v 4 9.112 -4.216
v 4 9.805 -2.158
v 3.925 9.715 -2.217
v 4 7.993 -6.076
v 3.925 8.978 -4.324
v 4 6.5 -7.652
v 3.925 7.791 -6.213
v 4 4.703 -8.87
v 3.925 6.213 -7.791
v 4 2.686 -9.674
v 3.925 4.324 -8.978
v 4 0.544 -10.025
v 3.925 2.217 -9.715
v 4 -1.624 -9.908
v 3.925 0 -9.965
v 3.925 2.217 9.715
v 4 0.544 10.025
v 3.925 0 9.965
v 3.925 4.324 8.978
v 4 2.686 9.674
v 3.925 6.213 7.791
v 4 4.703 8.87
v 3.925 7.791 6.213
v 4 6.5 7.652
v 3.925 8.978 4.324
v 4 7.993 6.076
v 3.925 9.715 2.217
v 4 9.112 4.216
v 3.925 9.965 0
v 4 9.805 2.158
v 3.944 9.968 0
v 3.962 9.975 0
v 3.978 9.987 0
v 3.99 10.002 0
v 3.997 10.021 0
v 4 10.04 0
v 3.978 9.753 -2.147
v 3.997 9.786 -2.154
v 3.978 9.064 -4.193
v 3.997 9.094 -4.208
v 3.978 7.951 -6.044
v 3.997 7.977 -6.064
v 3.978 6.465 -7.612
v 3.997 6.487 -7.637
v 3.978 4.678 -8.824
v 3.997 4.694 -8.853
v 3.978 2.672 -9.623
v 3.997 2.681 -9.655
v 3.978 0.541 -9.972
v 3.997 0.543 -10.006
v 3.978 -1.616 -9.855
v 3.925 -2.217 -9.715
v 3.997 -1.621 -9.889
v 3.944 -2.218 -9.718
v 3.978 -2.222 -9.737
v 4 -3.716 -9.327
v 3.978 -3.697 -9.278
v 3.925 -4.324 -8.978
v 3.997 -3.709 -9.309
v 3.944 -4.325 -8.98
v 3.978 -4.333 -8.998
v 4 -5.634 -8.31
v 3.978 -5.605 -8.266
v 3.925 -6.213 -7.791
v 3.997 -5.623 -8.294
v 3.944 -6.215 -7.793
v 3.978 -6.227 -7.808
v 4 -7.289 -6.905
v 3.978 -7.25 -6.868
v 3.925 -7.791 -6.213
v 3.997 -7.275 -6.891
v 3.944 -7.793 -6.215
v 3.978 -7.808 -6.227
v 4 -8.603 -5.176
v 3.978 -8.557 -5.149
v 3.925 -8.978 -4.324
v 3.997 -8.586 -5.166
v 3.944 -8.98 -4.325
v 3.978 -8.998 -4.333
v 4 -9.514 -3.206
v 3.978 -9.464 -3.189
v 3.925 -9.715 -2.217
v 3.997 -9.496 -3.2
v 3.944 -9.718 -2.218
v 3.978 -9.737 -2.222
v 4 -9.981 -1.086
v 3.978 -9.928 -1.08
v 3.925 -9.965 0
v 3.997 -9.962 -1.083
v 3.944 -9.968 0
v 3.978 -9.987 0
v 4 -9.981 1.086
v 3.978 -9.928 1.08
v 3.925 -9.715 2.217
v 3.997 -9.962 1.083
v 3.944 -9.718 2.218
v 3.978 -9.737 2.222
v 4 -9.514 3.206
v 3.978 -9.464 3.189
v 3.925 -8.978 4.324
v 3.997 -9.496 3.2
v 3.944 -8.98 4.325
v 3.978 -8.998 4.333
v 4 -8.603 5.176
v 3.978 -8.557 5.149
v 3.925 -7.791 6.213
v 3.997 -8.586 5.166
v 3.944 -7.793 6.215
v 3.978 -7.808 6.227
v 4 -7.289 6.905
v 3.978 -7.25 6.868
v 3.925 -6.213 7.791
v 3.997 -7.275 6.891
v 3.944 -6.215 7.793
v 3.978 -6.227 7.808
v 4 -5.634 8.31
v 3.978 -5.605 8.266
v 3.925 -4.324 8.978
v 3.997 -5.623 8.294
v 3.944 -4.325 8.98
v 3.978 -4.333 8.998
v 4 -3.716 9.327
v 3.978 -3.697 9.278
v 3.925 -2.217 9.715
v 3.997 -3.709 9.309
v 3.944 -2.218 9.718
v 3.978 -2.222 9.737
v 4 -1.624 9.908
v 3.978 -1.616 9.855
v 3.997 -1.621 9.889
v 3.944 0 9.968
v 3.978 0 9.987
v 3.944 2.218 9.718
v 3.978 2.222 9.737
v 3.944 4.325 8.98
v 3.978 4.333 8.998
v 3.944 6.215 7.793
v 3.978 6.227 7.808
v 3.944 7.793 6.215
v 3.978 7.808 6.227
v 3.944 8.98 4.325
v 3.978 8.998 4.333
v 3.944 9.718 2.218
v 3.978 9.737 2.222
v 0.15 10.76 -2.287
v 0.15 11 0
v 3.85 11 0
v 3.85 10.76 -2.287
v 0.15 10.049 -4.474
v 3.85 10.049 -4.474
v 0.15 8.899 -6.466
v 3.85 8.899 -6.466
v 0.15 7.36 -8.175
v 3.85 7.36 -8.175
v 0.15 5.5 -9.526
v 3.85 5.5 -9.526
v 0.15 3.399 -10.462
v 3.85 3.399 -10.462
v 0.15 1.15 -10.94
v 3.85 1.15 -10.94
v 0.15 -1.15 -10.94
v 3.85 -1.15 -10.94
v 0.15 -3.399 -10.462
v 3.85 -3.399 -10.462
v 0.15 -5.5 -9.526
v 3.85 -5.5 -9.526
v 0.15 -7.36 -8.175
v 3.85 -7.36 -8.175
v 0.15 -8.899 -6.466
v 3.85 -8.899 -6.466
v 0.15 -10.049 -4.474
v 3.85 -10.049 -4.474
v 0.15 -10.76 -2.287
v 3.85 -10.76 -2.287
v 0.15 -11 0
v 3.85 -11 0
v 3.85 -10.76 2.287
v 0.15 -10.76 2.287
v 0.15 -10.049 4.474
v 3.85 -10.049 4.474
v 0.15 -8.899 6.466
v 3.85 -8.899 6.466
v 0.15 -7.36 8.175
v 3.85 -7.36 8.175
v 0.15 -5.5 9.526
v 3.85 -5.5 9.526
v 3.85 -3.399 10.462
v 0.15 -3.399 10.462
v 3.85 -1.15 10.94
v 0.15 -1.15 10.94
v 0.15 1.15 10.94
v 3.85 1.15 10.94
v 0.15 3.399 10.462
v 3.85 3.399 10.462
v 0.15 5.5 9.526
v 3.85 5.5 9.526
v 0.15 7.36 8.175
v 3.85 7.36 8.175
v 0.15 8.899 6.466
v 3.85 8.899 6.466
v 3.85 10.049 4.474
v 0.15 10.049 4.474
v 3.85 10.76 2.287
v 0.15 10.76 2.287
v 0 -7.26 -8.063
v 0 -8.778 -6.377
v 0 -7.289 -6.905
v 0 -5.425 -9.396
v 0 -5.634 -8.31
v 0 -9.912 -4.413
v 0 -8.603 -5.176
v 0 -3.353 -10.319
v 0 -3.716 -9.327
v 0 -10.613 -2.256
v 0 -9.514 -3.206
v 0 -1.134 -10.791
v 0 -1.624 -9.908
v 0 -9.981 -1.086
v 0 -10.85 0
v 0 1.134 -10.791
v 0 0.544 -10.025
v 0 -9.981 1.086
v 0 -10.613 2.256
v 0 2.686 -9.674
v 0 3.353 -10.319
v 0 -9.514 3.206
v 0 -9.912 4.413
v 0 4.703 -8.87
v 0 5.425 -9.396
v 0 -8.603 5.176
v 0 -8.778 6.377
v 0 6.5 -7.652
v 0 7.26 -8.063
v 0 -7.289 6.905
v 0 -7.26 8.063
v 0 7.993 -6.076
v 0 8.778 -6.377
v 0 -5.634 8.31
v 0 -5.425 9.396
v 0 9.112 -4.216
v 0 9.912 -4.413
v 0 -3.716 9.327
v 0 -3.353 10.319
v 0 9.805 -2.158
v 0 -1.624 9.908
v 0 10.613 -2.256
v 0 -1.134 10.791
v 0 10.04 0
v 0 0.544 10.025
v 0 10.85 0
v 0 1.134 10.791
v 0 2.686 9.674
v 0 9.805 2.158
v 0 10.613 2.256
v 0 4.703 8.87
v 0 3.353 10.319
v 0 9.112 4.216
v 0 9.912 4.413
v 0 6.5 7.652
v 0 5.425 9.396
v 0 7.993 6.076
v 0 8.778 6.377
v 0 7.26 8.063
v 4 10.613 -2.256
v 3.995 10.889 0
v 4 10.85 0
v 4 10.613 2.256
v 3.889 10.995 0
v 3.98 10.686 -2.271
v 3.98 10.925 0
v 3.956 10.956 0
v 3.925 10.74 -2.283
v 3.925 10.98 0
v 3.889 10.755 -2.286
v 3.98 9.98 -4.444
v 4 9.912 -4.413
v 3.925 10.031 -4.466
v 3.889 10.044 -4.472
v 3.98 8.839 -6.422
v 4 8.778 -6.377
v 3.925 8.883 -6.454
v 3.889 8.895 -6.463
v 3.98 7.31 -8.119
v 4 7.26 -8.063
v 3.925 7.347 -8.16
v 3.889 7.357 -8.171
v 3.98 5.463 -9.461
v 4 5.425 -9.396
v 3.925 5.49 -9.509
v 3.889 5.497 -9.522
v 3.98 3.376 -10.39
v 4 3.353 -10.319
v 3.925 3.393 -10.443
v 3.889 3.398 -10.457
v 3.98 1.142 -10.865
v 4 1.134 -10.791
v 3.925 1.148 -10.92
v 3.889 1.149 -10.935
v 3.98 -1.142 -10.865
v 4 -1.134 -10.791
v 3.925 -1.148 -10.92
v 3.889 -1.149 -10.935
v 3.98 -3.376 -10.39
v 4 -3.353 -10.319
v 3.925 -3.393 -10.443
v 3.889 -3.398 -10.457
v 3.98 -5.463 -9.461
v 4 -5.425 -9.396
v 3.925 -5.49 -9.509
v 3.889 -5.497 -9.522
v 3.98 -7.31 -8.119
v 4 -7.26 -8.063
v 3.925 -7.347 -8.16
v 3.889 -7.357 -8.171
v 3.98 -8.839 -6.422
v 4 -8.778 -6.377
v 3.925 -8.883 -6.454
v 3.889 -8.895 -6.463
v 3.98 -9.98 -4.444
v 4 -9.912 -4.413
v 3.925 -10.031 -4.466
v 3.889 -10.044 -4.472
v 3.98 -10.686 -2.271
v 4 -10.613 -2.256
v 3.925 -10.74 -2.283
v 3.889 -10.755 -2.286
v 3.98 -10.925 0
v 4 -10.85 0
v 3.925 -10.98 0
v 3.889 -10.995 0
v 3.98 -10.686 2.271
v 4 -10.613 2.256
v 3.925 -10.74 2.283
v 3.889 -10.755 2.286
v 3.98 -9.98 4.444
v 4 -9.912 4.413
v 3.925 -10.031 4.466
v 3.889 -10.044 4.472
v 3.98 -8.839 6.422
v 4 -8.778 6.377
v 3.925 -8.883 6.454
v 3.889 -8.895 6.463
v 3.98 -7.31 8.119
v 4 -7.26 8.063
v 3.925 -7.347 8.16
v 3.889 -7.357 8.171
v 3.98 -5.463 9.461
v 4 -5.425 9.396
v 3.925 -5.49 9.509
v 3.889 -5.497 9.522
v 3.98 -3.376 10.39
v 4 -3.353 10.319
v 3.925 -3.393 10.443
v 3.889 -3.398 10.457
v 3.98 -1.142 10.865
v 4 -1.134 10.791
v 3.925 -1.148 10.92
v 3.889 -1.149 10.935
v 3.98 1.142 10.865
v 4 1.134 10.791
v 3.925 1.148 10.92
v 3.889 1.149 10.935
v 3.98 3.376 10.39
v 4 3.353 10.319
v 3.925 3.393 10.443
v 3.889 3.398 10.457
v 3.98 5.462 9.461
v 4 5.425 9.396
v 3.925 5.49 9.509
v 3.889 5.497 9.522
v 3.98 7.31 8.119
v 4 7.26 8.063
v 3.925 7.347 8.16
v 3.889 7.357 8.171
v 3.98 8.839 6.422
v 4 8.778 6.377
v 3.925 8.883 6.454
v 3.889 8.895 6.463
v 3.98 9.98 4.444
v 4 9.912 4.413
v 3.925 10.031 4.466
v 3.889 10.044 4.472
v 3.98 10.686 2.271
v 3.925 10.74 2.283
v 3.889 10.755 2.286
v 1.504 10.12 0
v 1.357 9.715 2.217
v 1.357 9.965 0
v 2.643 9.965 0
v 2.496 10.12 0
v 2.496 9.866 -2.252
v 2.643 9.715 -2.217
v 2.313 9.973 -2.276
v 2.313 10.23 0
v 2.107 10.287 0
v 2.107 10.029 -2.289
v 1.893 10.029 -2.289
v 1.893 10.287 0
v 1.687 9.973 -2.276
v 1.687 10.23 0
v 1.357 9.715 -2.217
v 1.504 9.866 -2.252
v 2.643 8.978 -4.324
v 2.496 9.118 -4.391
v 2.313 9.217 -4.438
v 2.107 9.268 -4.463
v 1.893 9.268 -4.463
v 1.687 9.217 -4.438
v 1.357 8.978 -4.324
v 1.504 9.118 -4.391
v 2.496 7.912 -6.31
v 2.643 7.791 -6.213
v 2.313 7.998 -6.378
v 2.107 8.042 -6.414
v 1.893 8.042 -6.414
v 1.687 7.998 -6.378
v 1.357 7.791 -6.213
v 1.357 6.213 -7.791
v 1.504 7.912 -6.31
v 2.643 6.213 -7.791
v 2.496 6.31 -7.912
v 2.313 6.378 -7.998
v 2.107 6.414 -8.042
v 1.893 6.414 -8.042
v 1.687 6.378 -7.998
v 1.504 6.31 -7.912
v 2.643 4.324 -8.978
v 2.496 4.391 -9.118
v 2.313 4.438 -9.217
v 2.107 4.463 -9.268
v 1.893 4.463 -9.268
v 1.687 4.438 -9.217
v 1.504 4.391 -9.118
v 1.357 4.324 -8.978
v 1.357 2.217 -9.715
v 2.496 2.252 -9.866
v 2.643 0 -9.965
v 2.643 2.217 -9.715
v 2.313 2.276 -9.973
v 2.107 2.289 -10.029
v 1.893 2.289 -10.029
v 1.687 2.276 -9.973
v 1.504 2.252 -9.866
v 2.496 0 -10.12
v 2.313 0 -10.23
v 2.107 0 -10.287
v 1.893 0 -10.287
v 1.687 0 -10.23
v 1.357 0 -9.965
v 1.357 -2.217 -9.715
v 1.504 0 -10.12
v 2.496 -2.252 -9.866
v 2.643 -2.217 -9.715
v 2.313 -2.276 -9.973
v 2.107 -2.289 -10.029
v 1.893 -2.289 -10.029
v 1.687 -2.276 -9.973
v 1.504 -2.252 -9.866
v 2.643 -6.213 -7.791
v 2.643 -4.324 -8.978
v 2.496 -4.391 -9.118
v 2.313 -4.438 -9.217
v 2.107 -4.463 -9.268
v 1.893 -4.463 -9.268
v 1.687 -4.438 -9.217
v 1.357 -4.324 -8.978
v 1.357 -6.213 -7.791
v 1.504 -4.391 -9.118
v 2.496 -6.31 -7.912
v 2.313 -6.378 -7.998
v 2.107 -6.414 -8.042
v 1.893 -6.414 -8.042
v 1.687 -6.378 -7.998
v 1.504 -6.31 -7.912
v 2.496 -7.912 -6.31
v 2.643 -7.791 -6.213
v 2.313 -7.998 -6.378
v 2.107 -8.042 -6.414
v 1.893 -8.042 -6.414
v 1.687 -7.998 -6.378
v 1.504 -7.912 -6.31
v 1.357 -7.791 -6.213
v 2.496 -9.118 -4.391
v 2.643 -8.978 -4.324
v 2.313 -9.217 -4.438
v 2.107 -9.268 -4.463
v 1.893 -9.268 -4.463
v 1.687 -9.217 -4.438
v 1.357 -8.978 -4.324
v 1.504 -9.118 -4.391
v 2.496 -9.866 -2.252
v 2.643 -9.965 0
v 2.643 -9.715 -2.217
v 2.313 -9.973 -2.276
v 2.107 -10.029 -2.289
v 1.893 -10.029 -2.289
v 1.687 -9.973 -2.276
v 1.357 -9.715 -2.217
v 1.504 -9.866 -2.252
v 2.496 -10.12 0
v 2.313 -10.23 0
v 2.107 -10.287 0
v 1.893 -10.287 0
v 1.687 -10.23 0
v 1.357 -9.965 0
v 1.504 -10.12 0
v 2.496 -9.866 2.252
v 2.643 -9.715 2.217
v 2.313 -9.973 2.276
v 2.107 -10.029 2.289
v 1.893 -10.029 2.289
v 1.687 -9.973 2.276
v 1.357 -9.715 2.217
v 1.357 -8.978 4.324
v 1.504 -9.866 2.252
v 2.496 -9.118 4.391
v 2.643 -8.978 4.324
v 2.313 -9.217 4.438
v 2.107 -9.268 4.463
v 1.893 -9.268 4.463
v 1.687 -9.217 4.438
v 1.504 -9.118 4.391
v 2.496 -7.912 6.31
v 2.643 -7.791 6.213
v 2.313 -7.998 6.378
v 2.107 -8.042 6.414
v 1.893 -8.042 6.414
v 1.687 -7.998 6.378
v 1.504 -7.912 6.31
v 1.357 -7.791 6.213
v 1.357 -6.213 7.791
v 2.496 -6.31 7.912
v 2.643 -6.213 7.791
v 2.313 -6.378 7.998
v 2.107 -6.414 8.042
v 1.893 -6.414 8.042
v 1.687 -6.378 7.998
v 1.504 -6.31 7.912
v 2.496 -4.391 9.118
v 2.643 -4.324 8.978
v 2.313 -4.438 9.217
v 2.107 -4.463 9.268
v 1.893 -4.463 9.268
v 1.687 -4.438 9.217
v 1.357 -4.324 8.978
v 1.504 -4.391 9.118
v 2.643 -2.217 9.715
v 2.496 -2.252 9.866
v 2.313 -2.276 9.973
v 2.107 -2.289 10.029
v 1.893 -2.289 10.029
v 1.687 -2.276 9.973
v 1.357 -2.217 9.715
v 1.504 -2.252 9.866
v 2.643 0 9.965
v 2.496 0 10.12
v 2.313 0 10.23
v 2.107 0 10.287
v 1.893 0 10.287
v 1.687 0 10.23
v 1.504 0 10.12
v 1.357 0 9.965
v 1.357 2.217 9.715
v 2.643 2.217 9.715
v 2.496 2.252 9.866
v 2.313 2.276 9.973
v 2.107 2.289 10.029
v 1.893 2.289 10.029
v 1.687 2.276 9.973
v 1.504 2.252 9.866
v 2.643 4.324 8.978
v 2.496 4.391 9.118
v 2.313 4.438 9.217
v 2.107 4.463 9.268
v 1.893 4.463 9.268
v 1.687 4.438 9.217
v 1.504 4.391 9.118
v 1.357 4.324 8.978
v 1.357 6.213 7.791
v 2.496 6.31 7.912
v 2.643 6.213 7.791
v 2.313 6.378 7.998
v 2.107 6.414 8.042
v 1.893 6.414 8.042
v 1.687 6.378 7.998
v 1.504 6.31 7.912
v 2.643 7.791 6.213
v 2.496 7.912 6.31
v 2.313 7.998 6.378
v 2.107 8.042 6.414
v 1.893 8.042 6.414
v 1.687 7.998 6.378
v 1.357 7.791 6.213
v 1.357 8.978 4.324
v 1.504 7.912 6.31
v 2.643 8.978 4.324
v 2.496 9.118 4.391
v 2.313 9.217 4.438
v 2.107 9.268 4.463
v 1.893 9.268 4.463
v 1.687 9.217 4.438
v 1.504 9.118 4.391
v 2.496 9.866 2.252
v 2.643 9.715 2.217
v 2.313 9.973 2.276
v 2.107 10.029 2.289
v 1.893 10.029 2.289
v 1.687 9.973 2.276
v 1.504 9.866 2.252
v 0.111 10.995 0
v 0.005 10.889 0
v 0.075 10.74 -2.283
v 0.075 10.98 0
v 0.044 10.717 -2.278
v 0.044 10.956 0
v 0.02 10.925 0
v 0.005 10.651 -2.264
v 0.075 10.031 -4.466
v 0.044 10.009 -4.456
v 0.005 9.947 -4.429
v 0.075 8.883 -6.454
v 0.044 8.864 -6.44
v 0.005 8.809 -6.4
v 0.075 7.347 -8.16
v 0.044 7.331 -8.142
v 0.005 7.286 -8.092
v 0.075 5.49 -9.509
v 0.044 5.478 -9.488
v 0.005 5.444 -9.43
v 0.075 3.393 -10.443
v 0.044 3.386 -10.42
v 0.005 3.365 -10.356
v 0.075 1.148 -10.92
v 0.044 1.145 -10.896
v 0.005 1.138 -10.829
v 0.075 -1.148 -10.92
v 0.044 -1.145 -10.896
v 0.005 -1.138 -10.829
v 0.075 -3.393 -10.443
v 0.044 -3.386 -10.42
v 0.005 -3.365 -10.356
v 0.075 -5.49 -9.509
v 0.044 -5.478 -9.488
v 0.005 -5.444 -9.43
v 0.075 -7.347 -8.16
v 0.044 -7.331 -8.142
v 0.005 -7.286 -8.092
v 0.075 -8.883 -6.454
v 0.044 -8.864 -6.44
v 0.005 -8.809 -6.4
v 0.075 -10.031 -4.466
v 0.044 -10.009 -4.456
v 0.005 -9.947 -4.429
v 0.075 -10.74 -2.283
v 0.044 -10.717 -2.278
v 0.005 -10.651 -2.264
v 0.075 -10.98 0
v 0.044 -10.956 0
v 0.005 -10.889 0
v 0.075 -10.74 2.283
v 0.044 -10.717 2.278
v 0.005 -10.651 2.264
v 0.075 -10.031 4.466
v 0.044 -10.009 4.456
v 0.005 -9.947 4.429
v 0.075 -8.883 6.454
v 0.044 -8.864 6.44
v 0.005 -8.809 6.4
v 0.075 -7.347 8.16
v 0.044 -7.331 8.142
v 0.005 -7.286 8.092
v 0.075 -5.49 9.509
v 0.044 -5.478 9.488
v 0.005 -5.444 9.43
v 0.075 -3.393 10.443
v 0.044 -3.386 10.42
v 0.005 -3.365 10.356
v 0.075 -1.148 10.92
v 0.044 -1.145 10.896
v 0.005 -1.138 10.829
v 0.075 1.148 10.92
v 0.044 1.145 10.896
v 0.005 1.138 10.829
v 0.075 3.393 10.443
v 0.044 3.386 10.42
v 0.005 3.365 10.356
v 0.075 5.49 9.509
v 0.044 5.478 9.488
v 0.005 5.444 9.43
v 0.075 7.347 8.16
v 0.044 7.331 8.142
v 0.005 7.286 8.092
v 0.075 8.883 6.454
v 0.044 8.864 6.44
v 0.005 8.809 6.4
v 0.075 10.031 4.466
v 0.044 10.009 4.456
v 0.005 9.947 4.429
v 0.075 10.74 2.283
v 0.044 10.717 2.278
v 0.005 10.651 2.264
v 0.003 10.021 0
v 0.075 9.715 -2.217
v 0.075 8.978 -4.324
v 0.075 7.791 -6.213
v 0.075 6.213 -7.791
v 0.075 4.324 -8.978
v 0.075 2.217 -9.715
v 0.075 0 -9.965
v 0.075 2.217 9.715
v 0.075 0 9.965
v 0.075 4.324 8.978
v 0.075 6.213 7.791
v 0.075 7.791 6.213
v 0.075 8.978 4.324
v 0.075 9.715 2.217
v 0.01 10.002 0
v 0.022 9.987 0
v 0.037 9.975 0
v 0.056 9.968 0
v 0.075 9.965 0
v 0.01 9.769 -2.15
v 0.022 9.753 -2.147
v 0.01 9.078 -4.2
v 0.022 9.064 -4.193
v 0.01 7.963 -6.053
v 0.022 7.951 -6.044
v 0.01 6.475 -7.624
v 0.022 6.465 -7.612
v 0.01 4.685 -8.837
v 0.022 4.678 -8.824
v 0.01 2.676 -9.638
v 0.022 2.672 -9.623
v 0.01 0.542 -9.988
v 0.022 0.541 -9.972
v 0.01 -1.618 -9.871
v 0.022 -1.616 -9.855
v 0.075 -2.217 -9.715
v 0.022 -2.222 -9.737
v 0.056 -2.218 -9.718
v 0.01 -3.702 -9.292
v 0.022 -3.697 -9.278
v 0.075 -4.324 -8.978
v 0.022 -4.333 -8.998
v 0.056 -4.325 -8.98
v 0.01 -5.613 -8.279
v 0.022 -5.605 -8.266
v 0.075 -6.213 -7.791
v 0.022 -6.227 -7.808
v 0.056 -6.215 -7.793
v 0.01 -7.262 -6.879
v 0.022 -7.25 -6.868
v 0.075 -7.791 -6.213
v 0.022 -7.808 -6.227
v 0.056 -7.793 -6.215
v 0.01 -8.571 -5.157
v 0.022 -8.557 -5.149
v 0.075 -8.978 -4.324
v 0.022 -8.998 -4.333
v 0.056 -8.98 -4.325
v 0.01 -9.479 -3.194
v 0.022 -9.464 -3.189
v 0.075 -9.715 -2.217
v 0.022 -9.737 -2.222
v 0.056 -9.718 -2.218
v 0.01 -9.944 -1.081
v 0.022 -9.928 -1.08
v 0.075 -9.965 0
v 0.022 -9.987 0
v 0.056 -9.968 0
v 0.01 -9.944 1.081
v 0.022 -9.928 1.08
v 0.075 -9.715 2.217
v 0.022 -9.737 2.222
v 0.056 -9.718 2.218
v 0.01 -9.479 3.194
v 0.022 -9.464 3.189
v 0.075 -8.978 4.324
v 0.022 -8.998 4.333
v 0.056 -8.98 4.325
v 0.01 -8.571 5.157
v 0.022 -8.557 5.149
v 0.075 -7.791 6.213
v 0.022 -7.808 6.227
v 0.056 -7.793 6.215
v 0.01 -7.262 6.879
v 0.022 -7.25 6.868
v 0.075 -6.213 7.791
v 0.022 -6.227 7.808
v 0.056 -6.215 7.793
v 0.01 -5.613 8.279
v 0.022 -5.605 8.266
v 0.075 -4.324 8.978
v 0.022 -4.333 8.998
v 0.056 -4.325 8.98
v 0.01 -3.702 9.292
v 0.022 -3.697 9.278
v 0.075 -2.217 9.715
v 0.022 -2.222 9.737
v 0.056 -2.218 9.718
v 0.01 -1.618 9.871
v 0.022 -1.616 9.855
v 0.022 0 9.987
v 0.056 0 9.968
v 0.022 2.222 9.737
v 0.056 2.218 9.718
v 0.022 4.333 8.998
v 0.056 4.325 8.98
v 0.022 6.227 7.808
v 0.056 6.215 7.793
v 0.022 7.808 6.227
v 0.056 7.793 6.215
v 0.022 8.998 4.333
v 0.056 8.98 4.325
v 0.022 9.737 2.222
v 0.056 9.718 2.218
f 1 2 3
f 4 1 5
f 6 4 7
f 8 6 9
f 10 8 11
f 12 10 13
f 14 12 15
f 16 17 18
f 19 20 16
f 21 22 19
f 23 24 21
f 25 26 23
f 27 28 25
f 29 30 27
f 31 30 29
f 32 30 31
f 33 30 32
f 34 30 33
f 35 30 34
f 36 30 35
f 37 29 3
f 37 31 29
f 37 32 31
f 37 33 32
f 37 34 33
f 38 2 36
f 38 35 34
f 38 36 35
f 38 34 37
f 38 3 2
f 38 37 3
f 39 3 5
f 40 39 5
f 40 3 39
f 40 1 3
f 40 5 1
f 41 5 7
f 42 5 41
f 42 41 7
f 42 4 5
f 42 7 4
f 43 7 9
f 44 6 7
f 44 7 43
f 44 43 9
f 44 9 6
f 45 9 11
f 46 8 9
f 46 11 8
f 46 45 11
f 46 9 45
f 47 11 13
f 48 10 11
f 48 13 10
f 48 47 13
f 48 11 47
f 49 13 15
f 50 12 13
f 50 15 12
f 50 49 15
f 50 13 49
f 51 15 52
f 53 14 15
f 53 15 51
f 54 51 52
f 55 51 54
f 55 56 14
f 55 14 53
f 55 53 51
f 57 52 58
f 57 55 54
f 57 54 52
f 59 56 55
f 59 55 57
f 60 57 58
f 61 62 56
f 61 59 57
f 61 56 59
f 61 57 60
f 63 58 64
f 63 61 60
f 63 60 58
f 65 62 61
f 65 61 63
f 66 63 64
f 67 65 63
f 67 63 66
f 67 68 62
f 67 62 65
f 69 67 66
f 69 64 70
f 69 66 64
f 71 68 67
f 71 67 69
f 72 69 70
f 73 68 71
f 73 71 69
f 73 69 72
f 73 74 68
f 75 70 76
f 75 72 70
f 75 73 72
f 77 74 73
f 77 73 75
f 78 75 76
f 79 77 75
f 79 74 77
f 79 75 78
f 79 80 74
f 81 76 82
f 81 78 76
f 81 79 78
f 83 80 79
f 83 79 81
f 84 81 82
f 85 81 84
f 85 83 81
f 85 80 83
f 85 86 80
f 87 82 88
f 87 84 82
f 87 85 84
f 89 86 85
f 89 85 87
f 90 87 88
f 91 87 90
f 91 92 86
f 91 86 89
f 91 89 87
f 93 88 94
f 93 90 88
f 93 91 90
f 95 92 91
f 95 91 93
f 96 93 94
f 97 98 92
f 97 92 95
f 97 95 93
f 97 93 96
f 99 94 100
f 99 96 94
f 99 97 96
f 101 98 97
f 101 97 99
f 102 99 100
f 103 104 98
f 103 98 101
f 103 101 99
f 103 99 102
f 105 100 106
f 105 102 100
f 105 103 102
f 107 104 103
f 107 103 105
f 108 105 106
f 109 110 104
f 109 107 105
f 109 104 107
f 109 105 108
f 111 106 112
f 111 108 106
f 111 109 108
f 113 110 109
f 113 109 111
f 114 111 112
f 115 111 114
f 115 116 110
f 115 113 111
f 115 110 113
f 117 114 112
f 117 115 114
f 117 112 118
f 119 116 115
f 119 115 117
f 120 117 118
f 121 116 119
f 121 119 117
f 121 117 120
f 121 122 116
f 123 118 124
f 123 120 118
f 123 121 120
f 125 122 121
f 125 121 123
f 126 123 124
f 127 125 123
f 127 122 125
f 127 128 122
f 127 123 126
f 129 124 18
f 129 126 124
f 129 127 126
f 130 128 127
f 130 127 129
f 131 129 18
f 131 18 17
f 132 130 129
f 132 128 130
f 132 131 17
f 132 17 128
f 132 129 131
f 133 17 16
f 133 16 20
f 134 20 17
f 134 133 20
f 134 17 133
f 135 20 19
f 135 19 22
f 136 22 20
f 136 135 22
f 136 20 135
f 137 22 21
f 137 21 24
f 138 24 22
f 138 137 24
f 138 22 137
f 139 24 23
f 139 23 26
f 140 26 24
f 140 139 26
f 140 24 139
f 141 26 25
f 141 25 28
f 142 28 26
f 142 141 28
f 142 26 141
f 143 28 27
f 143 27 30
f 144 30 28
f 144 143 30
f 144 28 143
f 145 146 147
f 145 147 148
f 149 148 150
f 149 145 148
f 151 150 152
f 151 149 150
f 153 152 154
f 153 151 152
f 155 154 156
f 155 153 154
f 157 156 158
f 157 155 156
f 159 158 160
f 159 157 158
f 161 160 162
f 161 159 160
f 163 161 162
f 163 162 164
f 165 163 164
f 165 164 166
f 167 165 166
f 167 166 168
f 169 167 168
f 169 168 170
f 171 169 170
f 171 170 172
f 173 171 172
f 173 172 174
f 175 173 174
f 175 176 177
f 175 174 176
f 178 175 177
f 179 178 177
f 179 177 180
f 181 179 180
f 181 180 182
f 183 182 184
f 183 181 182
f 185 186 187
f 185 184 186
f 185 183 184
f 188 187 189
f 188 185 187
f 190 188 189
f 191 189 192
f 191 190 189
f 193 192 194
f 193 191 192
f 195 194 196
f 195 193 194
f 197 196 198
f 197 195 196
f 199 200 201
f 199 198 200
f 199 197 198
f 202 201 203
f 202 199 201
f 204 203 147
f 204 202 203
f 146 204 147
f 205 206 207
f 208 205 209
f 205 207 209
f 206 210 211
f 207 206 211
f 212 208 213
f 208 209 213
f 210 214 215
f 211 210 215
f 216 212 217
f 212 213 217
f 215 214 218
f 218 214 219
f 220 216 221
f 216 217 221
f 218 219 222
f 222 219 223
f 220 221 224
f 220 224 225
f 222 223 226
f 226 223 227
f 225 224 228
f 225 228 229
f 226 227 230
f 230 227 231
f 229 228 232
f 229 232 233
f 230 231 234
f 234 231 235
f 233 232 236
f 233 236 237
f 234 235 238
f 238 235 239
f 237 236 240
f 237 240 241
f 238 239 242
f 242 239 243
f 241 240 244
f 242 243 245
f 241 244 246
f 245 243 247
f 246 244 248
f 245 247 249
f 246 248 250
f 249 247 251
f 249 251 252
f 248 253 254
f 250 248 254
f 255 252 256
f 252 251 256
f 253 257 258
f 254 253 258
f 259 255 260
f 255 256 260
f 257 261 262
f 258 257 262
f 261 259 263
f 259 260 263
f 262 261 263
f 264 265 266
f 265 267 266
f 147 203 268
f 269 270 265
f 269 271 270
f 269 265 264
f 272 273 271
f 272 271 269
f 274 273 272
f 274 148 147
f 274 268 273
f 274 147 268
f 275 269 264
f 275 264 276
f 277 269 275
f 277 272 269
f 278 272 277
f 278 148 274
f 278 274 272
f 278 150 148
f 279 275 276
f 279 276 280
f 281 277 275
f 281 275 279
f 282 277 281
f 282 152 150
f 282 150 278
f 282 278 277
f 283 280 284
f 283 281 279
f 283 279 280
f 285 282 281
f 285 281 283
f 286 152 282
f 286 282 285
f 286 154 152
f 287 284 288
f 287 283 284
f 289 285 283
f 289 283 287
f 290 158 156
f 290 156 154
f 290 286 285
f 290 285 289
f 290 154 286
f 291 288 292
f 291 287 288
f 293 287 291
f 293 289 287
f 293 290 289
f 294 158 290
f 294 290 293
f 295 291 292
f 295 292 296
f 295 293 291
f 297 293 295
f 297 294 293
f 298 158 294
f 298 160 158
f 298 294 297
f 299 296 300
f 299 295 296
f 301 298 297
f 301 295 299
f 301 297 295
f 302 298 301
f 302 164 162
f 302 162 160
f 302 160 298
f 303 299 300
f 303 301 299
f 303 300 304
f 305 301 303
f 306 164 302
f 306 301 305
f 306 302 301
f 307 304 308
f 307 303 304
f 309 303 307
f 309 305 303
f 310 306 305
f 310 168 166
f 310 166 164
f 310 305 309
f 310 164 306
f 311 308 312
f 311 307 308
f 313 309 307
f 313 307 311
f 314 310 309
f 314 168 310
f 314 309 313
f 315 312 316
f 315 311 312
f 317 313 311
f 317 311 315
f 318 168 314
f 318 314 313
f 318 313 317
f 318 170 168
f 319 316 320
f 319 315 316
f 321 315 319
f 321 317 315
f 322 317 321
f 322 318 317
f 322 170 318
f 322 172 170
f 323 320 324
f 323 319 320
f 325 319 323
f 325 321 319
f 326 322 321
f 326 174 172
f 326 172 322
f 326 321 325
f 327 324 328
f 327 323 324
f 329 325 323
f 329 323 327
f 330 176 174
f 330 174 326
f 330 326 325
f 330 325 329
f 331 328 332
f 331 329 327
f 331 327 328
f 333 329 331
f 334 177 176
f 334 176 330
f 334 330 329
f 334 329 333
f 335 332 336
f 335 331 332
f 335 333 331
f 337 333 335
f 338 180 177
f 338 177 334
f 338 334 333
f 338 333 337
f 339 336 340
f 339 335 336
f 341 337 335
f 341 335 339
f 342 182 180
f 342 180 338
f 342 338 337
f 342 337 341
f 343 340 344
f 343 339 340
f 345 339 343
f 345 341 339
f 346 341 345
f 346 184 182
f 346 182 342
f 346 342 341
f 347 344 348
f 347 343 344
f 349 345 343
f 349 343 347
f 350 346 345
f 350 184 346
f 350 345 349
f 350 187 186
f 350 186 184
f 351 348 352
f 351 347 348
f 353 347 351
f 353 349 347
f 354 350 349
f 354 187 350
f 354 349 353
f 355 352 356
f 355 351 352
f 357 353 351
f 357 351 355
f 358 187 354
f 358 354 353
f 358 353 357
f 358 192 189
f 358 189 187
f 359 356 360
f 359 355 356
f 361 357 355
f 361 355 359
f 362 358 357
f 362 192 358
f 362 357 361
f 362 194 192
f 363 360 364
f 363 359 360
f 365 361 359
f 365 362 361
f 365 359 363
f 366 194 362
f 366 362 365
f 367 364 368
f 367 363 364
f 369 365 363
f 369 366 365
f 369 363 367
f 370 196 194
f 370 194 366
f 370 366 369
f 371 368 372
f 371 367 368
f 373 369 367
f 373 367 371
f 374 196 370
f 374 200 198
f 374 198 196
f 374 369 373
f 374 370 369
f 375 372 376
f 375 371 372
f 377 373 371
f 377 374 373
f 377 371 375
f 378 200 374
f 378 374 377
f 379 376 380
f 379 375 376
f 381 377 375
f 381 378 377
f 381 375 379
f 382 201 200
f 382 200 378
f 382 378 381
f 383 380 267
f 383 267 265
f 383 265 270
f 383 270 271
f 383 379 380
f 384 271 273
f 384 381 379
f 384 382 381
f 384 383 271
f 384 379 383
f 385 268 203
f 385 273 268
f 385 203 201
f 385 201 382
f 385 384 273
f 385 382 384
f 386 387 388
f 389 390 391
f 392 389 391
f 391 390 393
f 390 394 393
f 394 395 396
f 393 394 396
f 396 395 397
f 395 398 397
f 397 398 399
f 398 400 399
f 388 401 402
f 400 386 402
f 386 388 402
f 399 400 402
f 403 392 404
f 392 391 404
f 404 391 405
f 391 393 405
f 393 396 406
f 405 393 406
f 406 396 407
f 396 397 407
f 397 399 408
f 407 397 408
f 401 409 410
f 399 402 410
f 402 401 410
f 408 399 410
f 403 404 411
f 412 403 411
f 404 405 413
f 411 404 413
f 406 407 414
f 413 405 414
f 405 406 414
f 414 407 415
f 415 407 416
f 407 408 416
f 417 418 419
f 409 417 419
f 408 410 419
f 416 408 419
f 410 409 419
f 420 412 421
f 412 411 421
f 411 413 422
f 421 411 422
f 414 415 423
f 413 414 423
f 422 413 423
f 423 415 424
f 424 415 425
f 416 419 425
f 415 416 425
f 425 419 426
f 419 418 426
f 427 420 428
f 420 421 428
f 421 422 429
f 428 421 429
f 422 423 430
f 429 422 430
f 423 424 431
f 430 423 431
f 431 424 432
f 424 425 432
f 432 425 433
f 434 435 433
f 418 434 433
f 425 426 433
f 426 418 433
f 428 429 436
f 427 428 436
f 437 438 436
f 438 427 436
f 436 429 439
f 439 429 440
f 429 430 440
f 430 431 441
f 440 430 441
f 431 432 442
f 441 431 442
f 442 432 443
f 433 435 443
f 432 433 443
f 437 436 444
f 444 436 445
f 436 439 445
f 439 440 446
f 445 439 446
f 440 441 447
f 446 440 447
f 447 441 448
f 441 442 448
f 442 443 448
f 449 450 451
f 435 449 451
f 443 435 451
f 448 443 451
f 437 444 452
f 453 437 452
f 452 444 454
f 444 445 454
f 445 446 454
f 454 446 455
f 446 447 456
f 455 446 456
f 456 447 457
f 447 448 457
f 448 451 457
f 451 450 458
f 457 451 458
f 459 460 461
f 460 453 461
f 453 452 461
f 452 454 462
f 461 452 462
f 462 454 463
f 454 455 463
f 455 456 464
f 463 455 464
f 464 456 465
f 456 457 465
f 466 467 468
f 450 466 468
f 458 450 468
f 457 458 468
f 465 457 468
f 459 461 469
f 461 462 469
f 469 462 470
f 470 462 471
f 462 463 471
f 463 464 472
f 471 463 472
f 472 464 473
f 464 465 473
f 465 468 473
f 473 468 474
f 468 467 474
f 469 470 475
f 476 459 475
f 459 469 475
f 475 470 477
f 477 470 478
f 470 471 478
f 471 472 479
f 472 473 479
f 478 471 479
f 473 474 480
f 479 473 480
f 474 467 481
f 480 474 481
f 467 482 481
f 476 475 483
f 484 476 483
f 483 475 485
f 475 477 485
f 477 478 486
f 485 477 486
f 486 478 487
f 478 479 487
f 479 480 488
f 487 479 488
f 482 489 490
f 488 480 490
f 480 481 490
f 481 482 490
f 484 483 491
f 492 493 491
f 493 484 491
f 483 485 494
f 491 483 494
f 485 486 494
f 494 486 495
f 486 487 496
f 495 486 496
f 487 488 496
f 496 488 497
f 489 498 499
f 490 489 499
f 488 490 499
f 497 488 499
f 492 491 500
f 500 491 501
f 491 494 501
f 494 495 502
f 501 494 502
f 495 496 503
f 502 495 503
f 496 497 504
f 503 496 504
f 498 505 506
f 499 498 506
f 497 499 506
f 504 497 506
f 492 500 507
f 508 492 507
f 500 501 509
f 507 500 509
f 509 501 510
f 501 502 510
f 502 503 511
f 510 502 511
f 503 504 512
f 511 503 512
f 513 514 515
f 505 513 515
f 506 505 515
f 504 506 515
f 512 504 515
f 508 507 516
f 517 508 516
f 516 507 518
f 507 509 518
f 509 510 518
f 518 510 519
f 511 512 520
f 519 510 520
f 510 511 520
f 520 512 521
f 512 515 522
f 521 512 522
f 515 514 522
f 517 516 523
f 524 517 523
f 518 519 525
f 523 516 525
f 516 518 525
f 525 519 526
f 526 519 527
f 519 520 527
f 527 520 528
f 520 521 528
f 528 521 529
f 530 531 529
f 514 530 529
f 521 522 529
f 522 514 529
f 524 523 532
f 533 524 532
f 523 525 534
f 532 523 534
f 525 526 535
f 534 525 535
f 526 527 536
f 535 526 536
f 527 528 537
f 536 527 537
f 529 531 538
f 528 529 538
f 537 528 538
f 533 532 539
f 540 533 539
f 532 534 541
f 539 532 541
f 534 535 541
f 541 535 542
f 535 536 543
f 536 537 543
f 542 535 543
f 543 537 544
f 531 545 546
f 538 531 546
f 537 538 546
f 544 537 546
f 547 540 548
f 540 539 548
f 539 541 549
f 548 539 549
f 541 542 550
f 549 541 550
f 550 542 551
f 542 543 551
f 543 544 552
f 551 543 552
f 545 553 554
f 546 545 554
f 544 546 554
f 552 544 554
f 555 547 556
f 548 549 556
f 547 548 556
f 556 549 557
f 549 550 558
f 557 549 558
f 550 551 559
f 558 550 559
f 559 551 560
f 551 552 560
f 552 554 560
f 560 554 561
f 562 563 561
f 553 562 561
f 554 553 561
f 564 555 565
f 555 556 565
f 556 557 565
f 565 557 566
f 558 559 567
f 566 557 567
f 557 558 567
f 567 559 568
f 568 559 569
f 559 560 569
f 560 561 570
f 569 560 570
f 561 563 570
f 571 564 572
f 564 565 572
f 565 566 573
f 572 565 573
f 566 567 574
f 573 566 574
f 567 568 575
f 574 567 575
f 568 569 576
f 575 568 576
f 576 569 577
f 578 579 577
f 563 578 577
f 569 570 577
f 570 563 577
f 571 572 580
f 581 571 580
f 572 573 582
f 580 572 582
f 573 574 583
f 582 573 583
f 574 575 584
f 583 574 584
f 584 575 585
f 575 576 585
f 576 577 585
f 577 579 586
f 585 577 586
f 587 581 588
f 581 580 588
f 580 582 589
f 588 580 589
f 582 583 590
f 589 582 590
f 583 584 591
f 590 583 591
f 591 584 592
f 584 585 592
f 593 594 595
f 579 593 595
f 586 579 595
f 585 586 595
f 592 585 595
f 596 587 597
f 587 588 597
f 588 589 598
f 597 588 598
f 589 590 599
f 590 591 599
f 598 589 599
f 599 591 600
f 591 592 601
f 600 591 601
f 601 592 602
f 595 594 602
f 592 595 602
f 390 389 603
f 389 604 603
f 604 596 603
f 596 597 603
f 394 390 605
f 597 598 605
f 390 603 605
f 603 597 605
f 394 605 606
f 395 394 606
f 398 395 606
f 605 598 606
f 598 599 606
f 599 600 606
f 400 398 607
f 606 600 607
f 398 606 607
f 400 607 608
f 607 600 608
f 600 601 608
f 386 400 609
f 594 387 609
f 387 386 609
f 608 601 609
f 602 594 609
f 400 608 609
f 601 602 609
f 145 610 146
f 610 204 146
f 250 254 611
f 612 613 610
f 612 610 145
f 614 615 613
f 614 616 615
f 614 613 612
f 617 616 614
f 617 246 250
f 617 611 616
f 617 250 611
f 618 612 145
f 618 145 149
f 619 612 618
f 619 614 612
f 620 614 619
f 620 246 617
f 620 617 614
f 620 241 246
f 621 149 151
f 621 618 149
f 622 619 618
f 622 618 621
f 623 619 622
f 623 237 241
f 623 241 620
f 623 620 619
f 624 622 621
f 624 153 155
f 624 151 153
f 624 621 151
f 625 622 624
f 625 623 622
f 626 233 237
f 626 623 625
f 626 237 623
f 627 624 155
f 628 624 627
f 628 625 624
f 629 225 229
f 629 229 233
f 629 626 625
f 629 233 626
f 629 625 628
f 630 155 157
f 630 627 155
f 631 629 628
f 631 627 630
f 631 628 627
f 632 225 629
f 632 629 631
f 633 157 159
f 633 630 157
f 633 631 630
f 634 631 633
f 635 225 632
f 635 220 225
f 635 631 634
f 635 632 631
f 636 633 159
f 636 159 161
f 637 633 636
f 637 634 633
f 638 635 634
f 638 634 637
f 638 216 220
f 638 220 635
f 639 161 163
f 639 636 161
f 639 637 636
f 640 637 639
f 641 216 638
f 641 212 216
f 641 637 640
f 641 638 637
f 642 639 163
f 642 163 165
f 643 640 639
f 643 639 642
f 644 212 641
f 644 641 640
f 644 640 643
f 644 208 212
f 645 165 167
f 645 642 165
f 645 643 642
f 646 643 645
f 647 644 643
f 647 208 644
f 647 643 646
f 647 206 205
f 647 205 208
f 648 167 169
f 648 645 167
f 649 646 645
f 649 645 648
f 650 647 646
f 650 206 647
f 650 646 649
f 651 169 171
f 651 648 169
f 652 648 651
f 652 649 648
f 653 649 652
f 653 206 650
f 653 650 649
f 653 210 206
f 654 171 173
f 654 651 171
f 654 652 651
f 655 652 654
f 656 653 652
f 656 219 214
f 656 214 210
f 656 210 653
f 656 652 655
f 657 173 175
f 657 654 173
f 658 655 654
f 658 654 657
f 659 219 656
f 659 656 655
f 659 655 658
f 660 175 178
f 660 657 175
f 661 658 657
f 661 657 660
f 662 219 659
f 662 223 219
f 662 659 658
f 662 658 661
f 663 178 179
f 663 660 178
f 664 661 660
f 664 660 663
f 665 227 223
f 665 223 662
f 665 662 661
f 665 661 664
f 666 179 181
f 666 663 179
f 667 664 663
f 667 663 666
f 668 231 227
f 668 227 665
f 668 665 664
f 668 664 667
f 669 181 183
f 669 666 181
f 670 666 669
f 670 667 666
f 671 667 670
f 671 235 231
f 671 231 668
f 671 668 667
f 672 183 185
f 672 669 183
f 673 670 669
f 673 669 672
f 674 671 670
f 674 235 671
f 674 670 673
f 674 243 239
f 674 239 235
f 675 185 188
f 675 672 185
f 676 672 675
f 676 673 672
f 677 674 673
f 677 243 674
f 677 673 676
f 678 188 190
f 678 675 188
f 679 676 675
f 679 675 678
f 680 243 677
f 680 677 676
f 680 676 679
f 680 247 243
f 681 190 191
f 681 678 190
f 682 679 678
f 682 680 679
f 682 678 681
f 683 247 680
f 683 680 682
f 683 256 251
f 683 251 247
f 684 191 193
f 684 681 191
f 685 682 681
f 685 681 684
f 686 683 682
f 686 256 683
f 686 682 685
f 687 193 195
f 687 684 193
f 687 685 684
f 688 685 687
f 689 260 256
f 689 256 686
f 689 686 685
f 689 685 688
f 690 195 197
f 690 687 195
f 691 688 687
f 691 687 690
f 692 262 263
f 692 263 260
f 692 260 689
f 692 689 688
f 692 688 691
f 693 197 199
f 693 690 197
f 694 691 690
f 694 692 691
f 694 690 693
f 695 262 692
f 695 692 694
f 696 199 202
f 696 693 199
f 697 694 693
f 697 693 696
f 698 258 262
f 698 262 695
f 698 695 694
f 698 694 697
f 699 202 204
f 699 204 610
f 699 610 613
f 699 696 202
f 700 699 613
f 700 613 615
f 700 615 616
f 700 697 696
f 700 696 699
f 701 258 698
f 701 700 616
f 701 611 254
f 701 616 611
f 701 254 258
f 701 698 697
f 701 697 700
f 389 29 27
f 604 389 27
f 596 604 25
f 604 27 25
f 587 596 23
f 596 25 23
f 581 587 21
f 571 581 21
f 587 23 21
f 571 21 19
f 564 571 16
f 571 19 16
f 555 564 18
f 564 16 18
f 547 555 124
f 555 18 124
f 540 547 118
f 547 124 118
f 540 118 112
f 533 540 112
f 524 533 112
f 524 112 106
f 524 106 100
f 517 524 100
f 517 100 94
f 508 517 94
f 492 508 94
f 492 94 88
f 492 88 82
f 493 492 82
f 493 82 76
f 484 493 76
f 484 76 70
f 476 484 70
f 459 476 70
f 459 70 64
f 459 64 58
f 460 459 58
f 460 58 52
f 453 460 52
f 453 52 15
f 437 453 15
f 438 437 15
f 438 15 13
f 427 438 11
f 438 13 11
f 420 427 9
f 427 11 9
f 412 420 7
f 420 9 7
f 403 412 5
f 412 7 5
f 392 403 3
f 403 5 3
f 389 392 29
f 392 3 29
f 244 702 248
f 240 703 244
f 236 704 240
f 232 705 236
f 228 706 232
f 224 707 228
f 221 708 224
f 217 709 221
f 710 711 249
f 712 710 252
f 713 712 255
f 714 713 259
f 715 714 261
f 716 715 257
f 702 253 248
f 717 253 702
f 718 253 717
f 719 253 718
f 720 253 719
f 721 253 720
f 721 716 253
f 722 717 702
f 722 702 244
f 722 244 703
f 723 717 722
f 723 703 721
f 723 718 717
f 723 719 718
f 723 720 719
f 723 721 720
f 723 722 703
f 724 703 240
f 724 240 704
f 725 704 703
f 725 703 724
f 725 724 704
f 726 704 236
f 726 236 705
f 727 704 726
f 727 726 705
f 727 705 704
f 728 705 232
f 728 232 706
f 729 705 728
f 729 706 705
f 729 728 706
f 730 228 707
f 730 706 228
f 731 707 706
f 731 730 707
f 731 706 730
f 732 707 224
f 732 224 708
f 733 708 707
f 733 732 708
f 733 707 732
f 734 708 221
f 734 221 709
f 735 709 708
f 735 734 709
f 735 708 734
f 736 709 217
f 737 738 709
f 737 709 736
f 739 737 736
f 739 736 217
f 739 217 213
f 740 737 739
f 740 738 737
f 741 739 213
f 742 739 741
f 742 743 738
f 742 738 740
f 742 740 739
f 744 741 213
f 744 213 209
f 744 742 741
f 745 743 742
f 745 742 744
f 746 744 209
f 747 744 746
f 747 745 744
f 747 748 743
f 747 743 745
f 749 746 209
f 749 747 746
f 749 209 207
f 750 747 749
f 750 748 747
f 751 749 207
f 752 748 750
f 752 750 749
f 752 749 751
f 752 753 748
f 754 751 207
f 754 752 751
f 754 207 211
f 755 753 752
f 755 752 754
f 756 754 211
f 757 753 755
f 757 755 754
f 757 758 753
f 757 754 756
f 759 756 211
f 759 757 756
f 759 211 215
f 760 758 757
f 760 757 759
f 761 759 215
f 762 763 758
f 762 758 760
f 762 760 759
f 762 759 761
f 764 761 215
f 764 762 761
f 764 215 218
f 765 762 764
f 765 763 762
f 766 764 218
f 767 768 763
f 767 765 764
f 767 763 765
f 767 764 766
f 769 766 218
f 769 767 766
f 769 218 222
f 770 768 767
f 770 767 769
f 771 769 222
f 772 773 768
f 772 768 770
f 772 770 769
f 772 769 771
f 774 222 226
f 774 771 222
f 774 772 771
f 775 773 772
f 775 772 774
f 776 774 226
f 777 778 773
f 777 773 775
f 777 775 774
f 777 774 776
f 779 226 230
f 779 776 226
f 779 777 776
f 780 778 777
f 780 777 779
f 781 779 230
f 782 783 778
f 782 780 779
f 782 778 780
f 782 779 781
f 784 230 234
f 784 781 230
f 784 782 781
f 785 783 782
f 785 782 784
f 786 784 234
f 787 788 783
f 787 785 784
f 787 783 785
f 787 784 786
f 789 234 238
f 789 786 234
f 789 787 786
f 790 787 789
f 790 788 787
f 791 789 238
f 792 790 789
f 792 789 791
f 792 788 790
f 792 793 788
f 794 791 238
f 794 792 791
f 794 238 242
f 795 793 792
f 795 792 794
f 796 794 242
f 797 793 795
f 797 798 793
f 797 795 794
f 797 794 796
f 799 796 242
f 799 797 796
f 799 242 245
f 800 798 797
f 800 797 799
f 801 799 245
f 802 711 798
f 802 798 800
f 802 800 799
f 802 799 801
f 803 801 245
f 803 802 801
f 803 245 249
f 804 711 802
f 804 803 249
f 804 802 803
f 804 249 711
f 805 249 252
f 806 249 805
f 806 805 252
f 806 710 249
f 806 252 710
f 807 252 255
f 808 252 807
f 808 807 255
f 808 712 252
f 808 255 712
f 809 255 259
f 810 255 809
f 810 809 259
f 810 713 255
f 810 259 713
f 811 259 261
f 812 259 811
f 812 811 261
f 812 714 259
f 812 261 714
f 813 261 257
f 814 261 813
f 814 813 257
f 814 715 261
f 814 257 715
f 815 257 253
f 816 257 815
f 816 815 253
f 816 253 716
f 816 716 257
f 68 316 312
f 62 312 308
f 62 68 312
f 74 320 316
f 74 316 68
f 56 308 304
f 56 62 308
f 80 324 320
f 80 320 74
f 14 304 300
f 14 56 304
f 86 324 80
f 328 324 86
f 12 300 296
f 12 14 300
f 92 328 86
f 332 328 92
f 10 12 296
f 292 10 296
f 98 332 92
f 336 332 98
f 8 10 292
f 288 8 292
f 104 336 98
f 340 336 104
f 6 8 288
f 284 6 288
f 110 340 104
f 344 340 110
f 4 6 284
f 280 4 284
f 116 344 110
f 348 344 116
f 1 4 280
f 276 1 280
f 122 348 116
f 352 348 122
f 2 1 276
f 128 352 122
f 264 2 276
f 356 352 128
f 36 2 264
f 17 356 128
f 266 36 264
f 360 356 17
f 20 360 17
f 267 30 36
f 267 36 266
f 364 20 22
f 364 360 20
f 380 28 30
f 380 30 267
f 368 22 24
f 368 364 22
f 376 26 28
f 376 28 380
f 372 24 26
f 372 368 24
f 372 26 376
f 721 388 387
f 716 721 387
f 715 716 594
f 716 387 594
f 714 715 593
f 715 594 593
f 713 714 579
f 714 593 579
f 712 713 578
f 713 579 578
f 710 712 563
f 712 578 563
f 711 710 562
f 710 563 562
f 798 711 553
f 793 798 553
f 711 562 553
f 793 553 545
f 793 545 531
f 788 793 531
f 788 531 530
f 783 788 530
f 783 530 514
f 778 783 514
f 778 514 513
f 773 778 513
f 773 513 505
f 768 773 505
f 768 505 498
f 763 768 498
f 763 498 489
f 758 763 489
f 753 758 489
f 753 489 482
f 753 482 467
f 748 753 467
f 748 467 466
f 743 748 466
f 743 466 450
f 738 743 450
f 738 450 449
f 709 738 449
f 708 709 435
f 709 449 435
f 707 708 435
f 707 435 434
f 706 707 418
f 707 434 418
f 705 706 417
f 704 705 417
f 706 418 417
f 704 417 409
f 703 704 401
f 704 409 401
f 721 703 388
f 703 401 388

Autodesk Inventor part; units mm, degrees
sketch "Sketch_1" plane through (0, 0, 0) normal (0, 0, 1) x (1, 0, 0)
  line L0 (4, 0) -> (0, 0)
  line L1 (0, 10.85) -> (0, 10.04)
  arc A0 (0, 10.04) -> (0.075, 9.965) centre (0.075, 10.04) ccw
  line L2 (0.075, 9.965) -> (1.3567, 9.965)
  arc A1 (2.6433, 9.965) -> (1.3567, 9.965) centre (2, 9.5) ccw
  line L3 (2.6433, 9.965) -> (3.925, 9.965)
  arc A2 (3.925, 9.965) -> (4, 10.04) centre (3.925, 10.04) ccw
  line L4 (4, 10.04) -> (4, 10.85)
  arc A3 (4, 10.85) -> (3.85, 11) centre (3.85, 10.85) ccw
  line L5 (3.85, 11) -> (0.15, 11)
  arc A4 (0.15, 11) -> (0, 10.85) centre (0.15, 10.85) ccw
revolve "Revolution1" add sketch "Sketch_1" angle 360 about axis through (4, 0, 0) along (1, 0, 0)
ref_plane "1_XY" through (2, 0, 0) normal (1, 0, 0) x (0, 0, -1)
ref_plane "1_YZ" through (2, 0, 0) normal (0, 0, -1) x (0, 1, 0)
ref_plane "1_ZX" through (2, 0, 0) normal (0, 1, 0) x (1, 0, 0)
properties part number "A-2216_or"
